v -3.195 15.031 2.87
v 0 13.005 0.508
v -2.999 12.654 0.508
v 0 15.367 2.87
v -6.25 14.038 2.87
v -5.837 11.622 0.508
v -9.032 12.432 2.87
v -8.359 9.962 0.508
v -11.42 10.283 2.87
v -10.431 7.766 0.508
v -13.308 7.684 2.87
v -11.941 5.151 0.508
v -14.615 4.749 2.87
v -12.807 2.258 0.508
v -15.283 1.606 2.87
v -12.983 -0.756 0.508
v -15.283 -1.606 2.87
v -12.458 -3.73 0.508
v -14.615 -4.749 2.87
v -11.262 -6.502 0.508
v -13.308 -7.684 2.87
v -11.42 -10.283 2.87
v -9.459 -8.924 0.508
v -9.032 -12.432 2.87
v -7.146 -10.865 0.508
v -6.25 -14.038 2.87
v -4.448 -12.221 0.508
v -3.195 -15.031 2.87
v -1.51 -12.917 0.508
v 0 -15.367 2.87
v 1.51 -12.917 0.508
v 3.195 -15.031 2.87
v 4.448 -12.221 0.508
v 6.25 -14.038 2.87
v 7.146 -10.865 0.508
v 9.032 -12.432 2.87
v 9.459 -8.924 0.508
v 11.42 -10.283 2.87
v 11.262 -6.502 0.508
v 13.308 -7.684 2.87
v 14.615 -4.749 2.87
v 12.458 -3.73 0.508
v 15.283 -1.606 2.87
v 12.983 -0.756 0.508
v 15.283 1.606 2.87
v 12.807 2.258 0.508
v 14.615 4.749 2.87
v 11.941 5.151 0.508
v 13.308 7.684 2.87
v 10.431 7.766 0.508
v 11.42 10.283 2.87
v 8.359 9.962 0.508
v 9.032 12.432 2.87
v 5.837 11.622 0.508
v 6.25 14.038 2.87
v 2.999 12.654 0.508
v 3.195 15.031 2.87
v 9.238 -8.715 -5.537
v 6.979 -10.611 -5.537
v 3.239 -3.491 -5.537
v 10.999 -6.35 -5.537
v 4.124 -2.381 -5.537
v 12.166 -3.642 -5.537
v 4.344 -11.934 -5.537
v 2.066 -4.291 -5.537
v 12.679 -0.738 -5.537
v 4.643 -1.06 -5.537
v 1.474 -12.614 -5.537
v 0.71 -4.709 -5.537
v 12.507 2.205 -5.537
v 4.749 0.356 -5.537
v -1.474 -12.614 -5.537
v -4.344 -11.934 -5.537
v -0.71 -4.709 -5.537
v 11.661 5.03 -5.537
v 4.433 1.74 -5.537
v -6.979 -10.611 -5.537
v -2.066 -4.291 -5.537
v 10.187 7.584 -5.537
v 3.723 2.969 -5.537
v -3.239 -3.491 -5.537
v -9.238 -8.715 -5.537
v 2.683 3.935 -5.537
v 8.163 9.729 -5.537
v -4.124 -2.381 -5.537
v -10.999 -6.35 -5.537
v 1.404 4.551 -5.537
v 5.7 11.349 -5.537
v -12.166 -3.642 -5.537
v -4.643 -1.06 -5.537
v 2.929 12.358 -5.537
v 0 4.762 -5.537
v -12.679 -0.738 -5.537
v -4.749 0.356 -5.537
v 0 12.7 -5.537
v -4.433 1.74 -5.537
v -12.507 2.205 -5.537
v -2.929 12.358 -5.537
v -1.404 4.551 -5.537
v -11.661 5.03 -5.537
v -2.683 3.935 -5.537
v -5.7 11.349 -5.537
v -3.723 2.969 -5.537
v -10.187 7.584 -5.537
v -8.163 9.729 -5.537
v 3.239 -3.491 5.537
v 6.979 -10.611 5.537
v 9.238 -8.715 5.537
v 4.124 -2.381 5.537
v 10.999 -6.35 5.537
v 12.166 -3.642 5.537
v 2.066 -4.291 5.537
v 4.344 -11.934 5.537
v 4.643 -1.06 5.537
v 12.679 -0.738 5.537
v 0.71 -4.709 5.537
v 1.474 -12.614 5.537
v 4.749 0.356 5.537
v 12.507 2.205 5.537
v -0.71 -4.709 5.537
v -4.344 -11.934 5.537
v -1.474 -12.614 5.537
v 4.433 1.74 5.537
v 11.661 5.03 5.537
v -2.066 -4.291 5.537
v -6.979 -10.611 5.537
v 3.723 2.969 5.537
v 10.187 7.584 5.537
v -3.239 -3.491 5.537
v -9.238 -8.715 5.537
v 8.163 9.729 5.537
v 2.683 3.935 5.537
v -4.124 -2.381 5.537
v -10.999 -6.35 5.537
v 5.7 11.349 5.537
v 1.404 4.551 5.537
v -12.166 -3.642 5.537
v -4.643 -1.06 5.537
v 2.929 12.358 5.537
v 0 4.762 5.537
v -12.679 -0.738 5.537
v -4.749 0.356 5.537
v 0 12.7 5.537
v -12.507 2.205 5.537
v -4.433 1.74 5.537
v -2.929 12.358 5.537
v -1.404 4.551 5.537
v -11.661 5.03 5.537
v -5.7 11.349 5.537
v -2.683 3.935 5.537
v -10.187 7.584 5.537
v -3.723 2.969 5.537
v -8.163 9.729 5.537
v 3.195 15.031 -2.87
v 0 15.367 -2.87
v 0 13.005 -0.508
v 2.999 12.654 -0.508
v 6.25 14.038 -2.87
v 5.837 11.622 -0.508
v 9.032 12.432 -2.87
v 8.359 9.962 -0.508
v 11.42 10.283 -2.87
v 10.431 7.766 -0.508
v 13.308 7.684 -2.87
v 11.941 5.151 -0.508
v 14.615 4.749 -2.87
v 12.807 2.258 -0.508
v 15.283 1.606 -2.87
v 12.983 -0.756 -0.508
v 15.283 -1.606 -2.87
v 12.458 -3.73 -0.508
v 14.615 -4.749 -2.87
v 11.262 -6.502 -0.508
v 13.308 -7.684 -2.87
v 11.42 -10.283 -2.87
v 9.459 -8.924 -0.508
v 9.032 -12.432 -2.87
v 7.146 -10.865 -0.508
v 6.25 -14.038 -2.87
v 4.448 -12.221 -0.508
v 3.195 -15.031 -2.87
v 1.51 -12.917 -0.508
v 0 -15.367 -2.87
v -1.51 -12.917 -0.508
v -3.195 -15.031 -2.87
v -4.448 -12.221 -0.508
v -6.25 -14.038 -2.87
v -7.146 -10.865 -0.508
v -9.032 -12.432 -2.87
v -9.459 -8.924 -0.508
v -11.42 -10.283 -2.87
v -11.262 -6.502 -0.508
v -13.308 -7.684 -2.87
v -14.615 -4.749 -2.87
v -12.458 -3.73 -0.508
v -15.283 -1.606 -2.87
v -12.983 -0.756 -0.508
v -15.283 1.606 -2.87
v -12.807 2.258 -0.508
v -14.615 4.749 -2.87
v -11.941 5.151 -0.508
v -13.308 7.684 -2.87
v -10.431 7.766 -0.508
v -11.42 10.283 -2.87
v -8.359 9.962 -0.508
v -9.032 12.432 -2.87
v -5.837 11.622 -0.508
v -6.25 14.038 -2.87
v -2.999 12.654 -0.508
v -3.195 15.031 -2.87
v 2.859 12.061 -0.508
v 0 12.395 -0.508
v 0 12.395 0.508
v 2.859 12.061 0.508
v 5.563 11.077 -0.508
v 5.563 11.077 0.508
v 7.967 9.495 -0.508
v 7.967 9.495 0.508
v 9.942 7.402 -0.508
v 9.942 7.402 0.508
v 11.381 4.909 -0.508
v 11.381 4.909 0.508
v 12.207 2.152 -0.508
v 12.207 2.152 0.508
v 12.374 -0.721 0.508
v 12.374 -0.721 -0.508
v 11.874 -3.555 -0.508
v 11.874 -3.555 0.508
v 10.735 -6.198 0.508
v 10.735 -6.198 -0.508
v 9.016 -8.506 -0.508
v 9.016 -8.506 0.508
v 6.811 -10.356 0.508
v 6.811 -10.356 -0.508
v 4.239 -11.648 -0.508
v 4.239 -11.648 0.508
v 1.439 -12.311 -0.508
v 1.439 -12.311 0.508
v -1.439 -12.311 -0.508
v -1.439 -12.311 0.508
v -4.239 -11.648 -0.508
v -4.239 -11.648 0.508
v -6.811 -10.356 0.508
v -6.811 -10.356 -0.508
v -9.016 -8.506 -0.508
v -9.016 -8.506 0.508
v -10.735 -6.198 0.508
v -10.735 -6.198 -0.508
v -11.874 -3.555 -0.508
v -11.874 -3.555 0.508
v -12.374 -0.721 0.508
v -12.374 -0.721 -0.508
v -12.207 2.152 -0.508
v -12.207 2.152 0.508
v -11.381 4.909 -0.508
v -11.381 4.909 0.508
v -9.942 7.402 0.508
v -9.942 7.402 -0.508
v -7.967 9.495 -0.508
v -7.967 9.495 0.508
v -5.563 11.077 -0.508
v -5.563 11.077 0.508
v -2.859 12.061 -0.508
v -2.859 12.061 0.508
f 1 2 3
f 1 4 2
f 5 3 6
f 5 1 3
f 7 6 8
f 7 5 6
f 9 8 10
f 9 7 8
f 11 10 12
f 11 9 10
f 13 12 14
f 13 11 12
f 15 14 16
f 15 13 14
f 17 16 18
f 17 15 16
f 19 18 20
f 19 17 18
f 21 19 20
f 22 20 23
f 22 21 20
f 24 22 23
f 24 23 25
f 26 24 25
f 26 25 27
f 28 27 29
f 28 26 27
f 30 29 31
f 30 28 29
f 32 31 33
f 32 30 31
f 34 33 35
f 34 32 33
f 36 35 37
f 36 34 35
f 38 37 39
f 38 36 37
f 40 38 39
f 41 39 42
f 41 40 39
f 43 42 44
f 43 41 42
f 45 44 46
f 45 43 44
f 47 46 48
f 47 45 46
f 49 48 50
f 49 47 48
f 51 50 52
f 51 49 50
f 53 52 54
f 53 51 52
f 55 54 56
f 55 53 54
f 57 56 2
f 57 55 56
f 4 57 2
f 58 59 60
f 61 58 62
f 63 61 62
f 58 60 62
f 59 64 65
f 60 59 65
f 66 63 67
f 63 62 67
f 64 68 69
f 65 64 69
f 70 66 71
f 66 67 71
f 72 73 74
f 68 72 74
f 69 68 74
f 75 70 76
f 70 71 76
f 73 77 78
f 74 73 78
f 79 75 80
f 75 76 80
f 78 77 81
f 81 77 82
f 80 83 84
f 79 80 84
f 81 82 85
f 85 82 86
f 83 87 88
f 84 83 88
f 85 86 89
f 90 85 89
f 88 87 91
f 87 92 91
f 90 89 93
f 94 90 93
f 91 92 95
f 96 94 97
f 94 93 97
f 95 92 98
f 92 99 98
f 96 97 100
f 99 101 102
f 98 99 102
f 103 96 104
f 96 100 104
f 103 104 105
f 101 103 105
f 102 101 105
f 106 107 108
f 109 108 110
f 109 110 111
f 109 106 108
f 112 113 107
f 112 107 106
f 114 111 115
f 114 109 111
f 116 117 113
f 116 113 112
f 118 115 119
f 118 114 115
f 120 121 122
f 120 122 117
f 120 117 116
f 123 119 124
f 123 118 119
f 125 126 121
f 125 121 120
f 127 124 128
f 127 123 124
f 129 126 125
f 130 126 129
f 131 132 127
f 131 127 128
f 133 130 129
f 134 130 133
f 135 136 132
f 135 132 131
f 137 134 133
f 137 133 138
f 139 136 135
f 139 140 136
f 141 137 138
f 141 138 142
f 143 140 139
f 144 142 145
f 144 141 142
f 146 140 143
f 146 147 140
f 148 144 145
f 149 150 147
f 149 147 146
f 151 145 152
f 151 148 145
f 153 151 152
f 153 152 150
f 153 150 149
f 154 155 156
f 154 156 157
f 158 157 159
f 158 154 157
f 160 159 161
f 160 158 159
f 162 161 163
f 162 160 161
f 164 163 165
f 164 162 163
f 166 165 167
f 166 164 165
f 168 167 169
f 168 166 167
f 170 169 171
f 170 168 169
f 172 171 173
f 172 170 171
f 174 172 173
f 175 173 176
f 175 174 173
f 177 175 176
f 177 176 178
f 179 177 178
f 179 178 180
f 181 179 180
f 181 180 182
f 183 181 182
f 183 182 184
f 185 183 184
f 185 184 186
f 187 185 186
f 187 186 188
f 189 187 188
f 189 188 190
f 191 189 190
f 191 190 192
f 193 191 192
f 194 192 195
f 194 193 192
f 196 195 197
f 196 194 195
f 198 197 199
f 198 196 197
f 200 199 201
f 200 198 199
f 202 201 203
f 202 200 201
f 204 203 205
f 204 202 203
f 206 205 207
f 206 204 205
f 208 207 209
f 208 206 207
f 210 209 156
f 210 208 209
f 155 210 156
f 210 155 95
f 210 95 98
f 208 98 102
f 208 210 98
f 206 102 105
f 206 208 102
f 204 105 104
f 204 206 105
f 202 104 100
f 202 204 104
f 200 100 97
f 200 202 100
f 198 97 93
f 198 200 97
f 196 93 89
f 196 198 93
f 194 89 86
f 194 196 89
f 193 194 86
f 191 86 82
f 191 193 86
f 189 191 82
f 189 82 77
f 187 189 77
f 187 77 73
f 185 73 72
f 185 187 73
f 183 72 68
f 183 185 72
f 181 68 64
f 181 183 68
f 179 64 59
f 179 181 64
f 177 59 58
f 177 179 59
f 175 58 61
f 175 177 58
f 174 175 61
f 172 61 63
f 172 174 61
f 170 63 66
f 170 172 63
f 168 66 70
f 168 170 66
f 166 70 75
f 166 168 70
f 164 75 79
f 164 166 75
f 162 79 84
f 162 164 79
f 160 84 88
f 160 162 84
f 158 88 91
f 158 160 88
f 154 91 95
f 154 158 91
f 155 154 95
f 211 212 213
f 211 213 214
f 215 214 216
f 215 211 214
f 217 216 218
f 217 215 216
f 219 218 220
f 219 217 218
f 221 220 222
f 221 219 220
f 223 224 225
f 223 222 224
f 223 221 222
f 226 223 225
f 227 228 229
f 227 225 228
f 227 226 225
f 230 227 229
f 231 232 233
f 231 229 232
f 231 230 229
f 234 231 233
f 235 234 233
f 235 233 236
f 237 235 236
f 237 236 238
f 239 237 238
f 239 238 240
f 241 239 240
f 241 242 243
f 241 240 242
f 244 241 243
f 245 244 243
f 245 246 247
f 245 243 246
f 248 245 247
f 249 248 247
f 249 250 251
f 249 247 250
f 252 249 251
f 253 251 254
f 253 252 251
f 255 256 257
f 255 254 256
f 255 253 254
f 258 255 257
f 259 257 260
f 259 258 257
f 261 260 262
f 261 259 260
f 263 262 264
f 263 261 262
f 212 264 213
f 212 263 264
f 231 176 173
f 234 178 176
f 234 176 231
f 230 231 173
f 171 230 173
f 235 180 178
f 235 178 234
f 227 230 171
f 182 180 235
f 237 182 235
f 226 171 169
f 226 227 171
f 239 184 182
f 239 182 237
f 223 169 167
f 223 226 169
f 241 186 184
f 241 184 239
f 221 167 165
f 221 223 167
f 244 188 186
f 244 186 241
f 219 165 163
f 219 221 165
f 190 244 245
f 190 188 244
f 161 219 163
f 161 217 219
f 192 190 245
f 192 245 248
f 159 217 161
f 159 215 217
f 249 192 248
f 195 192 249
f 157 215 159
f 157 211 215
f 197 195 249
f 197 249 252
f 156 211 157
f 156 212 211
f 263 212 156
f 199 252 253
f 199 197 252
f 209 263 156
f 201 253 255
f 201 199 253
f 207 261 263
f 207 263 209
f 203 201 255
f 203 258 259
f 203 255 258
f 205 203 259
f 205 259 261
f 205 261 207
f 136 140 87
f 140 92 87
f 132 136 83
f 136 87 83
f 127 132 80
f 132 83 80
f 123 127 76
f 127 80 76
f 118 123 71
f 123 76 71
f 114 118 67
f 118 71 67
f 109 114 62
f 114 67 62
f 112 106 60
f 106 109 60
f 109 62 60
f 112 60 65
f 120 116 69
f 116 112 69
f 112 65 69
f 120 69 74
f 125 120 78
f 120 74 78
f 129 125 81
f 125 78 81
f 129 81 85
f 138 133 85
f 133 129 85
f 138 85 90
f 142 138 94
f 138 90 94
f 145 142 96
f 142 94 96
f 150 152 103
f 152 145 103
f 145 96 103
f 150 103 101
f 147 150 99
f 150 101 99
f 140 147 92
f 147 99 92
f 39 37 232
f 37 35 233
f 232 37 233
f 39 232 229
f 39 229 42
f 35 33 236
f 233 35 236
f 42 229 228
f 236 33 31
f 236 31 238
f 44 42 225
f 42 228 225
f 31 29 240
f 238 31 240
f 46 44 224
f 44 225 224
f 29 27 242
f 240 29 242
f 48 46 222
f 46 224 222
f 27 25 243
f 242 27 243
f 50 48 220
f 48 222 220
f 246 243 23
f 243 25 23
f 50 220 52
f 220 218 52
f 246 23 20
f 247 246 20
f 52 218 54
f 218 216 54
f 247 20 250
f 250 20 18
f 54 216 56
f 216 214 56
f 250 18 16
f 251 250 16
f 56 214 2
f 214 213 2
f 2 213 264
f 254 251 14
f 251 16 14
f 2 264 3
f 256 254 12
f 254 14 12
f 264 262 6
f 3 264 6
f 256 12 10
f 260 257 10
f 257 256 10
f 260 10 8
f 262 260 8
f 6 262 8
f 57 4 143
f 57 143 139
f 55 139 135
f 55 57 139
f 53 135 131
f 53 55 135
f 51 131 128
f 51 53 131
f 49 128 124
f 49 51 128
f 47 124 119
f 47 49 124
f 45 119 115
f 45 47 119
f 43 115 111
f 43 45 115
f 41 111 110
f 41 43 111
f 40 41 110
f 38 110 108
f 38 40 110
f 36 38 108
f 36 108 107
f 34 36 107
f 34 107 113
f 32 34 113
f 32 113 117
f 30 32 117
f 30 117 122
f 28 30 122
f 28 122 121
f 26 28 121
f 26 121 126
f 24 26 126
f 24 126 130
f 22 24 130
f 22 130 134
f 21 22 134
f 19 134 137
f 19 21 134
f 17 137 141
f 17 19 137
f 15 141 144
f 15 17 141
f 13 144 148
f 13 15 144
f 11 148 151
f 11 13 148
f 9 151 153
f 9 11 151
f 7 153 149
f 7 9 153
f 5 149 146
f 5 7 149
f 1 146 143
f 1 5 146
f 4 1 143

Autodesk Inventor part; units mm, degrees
ref_plane "YZ Plane" through (0, 0, 0) normal (1, 0, 0) x (0, 1, 0)
ref_plane "XZ Plane" through (0, 0, 0) normal (0, 1, 0) x (-1, 0, 0)
ref_plane "XY Plane" through (0, 0, 0) normal (0, 0, 1) x (1, 0, 0)
sketch "Sketch1" plane through (0, 0, 0) normal (1, 0, 0) x (0, 1, 0)
  line L0 (4.7625, 5.5372) -> (4.7625, -5.5372)
  line L1 (4.7625, 5.5372) -> (12.7, 5.5372)
  line L2 (12.7, 5.5372) -> (15.367, 2.8702)
  line L3 (15.367, -2.8702) -> (12.7, -5.5372)
  line L4 (12.7, -5.5372) -> (4.7625, -5.5372)
  line L5 (4.7625, 0) -> (0, 0) construction
  line L6 (4.7625, 0) -> (12.3952, 0) construction
  line L7 (15.367, 2.8702) -> (13.0048, 0.508)
  line L8 (13.0048, -0.508) -> (15.367, -2.8702)
  line L9 (13.0048, 0.508) -> (12.3952, 0.508)
  line L10 (12.3952, 0.508) -> (12.3952, -0.508)
  line L11 (12.3952, -0.508) -> (13.0048, -0.508)
  line L12 (0, -5.4393) -> (0, 5.4393) construction
  line L13 (12.7, 5.5372) -> (12.7, 0.508) construction
  dimension "d0" = 4.7625
  dimension "d1" = 12.7
  dimension "d3" = 1.016
  dimension "d4" = 11.0744
  dimension "d6" = 15.367
  dimension "d7" = 5.7404
revolve "Revolution1" add sketch "Sketch1" angle 360 about axis through (0, 0, -5.4393) along (0, 0, 1)
properties part number "roller" material "Steel, Alloy"
